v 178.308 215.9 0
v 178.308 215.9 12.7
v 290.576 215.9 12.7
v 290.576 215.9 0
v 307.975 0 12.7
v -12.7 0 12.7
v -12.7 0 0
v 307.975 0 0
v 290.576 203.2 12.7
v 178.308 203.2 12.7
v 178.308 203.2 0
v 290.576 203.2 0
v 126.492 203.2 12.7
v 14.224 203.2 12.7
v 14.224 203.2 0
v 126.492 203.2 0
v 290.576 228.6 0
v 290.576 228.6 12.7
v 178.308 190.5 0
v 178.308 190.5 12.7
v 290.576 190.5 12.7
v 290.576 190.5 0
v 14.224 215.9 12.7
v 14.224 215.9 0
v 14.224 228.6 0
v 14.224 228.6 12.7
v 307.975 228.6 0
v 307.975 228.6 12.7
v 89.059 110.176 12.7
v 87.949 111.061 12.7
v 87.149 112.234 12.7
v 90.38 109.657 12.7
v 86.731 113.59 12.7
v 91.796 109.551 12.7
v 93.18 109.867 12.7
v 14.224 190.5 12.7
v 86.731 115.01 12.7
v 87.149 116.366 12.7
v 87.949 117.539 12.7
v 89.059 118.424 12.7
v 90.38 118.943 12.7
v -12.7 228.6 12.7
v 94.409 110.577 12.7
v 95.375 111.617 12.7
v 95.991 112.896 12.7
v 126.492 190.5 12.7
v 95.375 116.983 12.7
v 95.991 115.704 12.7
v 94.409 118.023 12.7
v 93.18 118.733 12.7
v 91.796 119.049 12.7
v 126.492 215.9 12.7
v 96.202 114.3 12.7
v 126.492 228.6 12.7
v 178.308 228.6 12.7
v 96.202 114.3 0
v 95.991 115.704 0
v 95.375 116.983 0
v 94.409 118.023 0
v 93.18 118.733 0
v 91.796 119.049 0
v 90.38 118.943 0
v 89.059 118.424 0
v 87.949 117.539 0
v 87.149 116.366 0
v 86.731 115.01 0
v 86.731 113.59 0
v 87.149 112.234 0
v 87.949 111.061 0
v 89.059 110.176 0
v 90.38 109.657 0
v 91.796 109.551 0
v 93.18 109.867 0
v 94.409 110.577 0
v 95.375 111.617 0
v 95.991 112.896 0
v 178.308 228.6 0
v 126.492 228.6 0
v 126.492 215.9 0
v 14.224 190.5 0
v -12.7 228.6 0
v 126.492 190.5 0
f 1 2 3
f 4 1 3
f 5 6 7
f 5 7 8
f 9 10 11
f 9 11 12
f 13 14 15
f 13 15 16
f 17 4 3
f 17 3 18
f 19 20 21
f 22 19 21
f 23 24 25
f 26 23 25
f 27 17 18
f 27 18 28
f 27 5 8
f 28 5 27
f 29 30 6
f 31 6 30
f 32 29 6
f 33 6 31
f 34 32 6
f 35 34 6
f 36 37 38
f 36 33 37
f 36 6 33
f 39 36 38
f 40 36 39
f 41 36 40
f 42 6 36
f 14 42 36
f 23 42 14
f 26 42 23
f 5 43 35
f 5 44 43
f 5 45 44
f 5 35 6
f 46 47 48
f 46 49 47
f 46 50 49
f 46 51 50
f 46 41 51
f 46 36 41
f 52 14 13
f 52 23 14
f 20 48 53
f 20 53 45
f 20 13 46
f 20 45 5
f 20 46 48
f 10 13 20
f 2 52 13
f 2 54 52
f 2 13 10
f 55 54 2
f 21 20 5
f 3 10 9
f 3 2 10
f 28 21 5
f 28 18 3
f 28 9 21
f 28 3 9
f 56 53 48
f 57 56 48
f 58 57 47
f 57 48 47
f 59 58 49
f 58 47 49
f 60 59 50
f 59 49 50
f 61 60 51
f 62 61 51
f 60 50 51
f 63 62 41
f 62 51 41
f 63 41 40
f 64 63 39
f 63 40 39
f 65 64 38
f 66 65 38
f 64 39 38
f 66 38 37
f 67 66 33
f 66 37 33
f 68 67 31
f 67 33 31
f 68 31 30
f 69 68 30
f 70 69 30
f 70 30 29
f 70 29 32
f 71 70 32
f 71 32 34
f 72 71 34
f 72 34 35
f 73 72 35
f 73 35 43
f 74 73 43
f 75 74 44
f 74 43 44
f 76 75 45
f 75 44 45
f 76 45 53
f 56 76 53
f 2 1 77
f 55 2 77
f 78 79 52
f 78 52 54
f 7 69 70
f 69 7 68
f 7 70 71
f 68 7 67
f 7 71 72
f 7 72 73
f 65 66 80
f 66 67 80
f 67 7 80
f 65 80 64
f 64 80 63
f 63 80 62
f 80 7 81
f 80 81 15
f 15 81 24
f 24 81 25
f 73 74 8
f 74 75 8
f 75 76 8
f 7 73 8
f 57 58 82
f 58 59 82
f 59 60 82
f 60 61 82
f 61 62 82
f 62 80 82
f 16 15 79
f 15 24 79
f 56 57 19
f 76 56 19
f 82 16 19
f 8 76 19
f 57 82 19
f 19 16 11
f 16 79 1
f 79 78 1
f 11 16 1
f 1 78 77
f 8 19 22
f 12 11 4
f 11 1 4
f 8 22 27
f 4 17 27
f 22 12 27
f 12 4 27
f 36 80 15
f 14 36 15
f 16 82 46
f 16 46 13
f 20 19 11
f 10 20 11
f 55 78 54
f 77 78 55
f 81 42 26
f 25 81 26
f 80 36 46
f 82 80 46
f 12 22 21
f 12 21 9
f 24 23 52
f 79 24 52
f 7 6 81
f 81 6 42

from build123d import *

# Parameters (mm, degrees)
SKETCH1_W           = 304.8
SKETCH1_H           = 228.6
BOSS_EXTRUDE1_DEPTH = 12.7
SKETCH2_R           = 4.7625
CUT_EXTRUDE1_DEPTH  = 12.7
SKETCH7_W           = 112.268
SKETCH7_H           = 12.7
CUT_EXTRUDE2_DEPTH  = 12.7
SKETCH8_W           = 12.7
SKETCH8_H           = 228.6
SKETCH8_W_2         = 3.175
BOSS_EXTRUDE2_DEPTH = 12.7


with BuildPart() as part:
    # Sketch1 → Boss-Extrude1 (new body)
    with BuildSketch(Plane.XY):
        with Locations((152.4, 114.3)):
            Rectangle(SKETCH1_W, SKETCH1_H)
    extrude(amount=BOSS_EXTRUDE1_DEPTH)

    # Sketch2 → Cut-Extrude1 (cut)
    with BuildSketch(Plane.XY.offset(12.7)):
        with Locations((91.44, 114.3)):
            Circle(SKETCH2_R)
    extrude(amount=-CUT_EXTRUDE1_DEPTH, mode=Mode.SUBTRACT)

    # Sketch7 → Cut-Extrude2 (cut)
    with BuildSketch(Plane.XY.offset(12.7)):
        with Locations((70.358, 222.25)):
            Rectangle(SKETCH7_W, SKETCH7_H)
        with Locations((234.442, 222.25)):
            Rectangle(SKETCH7_W, SKETCH7_H)
        with Locations((70.358, 196.85)):
            Rectangle(SKETCH7_W, SKETCH7_H)
        with Locations((234.442, 196.85)):
            Rectangle(SKETCH7_W, SKETCH7_H)
    extrude(amount=-CUT_EXTRUDE2_DEPTH, mode=Mode.SUBTRACT)

    # Sketch8 → Boss-Extrude2 (add)
    with BuildSketch(Plane.XY.offset(12.7)):
        with Locations((-6.35, 114.3)):
            Rectangle(SKETCH8_W, SKETCH8_H)
        with Locations((306.3875, 114.3)):
            Rectangle(SKETCH8_W_2, SKETCH8_H)
    extrude(amount=-BOSS_EXTRUDE2_DEPTH)


solid = part.part
